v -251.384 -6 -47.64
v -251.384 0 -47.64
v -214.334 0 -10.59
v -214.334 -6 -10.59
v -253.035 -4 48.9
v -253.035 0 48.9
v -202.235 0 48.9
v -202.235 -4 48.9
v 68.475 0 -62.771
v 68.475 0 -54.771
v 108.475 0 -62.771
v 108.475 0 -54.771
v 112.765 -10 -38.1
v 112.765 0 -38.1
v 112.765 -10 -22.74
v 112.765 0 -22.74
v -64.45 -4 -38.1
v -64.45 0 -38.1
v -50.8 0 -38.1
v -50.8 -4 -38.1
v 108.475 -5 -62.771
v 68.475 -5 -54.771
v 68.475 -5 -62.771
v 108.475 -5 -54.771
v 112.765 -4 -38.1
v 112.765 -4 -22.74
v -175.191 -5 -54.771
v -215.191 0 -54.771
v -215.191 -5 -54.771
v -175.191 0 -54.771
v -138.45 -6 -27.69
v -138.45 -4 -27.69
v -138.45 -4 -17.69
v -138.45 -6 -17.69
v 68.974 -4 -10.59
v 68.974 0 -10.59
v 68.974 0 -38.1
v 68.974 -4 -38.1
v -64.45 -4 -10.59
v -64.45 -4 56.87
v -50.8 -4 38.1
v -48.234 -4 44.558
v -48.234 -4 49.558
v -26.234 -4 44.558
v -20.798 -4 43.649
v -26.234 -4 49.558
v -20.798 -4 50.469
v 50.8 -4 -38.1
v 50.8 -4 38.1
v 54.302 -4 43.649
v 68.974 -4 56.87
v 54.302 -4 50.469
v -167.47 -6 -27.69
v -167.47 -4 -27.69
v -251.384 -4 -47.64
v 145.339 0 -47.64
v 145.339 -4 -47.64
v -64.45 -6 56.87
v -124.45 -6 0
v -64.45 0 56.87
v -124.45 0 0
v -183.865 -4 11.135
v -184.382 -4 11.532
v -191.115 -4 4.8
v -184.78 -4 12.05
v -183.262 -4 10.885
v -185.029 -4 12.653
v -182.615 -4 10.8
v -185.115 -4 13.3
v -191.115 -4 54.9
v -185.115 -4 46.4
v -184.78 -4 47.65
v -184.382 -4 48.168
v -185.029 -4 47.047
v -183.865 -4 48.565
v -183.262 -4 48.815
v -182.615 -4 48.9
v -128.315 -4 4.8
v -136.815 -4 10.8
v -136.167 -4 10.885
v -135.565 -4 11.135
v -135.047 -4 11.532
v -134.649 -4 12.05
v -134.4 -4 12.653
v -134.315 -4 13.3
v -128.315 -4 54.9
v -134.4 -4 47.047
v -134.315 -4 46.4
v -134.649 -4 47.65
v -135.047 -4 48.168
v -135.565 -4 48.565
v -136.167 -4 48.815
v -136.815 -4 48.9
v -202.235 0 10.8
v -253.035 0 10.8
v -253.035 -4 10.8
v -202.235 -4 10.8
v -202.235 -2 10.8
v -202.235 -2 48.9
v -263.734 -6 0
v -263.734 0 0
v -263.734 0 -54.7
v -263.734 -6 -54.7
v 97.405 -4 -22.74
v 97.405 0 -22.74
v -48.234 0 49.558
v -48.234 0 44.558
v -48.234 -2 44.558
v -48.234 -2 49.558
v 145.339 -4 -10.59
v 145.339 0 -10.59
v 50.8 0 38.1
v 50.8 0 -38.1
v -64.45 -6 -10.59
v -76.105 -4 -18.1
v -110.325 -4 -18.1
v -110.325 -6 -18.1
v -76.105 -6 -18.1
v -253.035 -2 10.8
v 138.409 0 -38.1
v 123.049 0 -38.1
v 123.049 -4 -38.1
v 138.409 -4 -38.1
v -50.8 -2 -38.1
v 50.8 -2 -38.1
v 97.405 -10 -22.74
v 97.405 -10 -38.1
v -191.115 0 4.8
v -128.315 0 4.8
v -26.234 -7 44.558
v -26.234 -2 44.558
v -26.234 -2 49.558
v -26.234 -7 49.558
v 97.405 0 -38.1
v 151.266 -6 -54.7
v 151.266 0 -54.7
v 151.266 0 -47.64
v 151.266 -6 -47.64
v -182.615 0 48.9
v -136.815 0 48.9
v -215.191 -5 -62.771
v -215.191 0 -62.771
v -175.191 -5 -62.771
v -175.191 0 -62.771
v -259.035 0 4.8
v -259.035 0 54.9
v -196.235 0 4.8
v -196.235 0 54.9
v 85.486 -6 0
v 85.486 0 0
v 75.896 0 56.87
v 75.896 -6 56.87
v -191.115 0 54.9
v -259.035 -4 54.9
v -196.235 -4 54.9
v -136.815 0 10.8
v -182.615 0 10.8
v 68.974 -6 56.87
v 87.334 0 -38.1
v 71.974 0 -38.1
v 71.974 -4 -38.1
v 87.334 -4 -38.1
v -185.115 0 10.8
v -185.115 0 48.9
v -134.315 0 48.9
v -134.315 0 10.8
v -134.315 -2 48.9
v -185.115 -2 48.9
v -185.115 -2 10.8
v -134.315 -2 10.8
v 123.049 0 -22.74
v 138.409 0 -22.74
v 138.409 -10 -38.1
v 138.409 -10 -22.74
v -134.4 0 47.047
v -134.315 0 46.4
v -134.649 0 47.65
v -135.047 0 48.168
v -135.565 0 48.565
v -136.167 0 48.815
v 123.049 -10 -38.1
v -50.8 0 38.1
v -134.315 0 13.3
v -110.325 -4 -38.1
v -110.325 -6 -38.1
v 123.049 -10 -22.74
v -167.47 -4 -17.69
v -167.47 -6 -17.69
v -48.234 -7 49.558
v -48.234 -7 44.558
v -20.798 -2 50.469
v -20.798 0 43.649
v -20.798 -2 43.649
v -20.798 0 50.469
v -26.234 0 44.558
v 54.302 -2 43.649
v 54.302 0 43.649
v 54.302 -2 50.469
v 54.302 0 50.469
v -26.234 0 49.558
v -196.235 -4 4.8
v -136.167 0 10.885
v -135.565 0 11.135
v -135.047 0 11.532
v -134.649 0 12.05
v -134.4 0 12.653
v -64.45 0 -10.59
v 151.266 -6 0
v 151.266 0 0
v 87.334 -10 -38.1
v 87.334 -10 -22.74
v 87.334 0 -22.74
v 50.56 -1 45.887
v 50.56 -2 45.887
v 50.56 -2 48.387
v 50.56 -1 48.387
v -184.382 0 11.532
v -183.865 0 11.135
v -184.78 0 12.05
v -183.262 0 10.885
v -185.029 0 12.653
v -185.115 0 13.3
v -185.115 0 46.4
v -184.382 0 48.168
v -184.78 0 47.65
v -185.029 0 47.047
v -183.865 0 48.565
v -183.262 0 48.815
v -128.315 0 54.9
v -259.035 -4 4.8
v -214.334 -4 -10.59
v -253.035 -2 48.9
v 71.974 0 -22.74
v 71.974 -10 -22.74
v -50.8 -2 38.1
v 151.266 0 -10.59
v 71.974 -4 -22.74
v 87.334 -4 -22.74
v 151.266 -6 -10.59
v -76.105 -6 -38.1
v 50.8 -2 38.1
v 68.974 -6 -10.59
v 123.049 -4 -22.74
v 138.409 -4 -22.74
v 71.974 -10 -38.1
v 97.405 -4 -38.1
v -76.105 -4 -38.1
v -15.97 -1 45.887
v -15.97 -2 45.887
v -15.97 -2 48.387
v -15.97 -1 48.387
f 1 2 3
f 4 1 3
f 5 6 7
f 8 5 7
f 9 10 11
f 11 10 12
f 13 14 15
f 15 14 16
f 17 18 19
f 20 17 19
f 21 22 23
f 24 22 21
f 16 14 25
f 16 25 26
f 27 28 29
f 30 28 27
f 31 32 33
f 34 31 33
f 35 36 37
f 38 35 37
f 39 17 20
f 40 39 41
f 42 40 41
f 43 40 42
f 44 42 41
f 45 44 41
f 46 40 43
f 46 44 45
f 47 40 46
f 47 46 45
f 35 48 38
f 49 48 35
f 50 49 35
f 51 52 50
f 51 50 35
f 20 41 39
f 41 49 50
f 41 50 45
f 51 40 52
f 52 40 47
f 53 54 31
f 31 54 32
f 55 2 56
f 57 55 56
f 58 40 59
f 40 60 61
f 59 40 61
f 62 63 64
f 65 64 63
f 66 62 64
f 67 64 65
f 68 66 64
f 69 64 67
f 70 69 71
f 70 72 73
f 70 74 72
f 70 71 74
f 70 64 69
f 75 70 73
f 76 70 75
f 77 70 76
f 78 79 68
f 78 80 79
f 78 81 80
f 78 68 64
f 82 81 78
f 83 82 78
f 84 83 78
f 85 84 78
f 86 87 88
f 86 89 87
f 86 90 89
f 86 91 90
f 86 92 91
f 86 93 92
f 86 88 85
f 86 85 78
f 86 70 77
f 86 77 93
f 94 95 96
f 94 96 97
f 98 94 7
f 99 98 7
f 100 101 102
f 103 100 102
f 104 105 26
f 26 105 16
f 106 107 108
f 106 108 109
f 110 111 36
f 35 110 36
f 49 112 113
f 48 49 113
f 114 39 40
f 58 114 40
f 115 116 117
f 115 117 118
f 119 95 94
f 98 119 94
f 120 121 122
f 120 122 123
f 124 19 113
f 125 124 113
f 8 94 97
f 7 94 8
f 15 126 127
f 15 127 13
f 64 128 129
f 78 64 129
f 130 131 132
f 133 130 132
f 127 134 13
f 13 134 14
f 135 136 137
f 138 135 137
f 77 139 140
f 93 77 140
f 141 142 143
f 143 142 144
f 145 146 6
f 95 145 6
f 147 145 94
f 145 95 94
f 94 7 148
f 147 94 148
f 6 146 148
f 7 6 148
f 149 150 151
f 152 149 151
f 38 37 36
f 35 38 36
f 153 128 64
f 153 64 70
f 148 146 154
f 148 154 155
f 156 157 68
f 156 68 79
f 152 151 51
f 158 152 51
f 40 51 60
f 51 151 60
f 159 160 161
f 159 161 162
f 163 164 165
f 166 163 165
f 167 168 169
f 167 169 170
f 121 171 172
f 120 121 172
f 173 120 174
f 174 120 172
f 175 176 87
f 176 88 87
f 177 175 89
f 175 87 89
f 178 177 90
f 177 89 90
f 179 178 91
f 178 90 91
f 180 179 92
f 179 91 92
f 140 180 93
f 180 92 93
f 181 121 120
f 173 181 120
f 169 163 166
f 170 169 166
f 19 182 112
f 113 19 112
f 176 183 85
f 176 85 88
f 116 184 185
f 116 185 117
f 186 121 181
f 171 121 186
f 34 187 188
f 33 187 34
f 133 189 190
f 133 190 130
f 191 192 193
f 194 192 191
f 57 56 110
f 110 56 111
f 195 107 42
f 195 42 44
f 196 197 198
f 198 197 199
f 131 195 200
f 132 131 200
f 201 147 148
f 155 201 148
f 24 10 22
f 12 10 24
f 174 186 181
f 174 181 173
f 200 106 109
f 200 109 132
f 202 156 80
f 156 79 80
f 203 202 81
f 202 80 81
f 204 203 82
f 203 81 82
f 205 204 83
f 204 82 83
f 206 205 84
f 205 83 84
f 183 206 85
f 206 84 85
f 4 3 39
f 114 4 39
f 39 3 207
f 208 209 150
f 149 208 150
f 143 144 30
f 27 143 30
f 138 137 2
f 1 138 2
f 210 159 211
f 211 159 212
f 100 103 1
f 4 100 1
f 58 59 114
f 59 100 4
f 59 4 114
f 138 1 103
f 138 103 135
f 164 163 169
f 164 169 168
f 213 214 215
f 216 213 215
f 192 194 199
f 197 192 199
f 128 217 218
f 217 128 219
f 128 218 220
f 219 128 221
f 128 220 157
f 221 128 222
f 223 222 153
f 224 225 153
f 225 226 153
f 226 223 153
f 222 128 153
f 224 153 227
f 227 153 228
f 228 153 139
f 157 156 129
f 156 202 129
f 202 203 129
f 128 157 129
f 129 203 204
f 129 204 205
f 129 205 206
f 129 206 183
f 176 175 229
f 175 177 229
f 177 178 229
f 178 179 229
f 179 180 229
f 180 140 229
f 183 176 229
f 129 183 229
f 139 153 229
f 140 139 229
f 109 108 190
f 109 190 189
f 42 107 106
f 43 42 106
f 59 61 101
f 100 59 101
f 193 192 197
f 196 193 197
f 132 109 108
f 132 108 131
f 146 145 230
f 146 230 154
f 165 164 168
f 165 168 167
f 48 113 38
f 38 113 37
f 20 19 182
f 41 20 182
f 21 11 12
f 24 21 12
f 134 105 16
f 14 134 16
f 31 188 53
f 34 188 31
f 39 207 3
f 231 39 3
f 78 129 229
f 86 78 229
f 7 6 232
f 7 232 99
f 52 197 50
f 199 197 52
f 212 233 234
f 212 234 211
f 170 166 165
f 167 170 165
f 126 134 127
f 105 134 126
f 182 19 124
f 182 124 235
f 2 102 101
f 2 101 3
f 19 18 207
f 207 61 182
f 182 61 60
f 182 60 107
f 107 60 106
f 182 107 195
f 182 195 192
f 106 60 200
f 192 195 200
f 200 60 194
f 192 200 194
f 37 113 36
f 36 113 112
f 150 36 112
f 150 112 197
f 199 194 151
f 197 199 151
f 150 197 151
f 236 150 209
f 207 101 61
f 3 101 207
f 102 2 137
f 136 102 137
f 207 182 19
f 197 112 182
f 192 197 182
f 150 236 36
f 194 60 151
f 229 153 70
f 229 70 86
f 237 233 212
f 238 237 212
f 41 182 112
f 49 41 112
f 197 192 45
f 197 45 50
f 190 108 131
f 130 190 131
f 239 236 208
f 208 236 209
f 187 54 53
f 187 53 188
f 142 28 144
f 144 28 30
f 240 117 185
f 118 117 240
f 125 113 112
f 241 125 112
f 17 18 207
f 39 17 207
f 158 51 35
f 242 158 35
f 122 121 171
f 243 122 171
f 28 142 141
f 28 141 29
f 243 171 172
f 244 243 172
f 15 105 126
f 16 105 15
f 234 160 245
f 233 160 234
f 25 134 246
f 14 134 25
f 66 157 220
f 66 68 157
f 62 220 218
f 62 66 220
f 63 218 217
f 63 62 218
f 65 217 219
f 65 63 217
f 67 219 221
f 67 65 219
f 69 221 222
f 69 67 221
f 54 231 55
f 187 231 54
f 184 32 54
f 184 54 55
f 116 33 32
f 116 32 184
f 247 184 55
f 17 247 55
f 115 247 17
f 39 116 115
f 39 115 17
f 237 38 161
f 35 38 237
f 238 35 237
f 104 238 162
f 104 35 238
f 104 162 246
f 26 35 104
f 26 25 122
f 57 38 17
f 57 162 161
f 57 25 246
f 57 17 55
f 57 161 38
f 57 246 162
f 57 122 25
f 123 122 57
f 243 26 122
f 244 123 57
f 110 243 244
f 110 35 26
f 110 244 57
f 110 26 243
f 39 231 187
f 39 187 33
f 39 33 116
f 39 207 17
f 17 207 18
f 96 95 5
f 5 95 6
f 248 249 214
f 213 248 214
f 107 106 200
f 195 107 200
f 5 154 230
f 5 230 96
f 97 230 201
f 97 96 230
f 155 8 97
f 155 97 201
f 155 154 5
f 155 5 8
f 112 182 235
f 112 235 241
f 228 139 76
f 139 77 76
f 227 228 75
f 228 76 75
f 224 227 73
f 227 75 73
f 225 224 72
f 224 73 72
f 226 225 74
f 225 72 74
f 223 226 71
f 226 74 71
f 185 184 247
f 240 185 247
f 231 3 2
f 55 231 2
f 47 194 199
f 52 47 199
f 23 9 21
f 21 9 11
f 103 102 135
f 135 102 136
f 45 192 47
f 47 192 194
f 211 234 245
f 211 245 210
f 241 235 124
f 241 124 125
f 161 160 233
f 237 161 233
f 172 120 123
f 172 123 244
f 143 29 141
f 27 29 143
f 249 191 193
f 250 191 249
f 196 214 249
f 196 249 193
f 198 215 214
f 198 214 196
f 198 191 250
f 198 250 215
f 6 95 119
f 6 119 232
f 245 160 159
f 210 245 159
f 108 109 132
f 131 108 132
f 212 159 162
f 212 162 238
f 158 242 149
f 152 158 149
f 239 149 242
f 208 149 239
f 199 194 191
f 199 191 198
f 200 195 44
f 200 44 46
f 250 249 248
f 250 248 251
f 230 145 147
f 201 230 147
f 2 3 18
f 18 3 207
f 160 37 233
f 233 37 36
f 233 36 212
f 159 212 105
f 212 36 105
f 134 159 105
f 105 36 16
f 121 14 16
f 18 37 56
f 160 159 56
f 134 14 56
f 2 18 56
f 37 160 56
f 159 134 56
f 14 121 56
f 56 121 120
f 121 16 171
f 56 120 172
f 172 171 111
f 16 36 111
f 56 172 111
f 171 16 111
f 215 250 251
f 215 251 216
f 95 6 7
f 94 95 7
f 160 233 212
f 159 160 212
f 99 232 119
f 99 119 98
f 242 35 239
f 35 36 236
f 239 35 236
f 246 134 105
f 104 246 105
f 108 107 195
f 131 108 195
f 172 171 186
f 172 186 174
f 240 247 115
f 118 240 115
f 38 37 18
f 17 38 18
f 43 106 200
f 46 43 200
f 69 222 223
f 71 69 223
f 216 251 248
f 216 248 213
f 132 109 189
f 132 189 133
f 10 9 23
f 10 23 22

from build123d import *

# Parameters (mm, degrees)
F0_W      = 15.36
F0_H      = 15.36
F1_DEPTH  = 10
F0_W_2    = 50.8
F0_H_2    = 38.1
F0_W_3    = 101.6
F0_H_3    = 76.2
F0_W_4    = 75.1
F0_H_4    = 6.82
F0_W_5    = 22
F0_H_5    = 5
F2_DEPTH  = 2
F3_W      = 66.53
F3_H      = 2.5
F4_DEPTH  = 1
F5_DEPTH  = 4
F6_DEPTH  = 5
F0_W_6    = 62.8
F0_H_6    = 50.1
F7_DEPTH  = 4
F8_R      = 2.5
F9_DEPTH  = 6
F0_W_7    = 34.22
F0_H_7    = 20
F0_W_8    = 29.02
F0_H_8    = 10
F10_DEPTH = 4
F11_DEPTH = 6
F12_W     = 40
F12_H     = 8
F13_DEPTH = 5


with BuildPart() as f1:
    # F0 (on Front) → F1 (new body)
    with BuildSketch(Plane.XZ):
        with Locations((130.7291623282, -30.4200009418)):
            Rectangle(F0_W, F0_H)
        with Locations((105.0850164223, -30.4200009418)):
            Rectangle(F0_W, F0_H)
        with Locations((79.6542178917, -30.4200004709)):
            Rectangle(F0_W, F0_H)
    extrude(amount=F1_DEPTH)


with BuildPart() as f2:
    # F0 (on Front) → F2 (new body)
    with BuildSketch(Plane.XZ):
        with Locations((-227.6345144272, 29.8500025563)):
            Rectangle(F0_W_2, F0_H_2)
        with Locations((-159.7145144272, 29.8500025563)):
            Rectangle(F0_W_2, F0_H_2)
        Rectangle(F0_W_3, F0_H_3)
        with Locations((16.7518402368, 47.0588352716)):
            Rectangle(F0_W_4, F0_H_4)
        with Locations((-37.2341555208, 47.0578887403)):
            Rectangle(F0_W_5, F0_H_5)
    extrude(amount=F2_DEPTH)

    # F3 (on face) → F4 (cut)
    with BuildSketch(Plane.XZ.offset(2)):
        with Locations((17.2950534379, 47.1370157599)):
            Rectangle(F3_W, F3_H)
    extrude(amount=-F4_DEPTH, mode=Mode.SUBTRACT)


with BuildPart() as f5:
    # F0 (on Front) → F5 (new body)
    with BuildSketch(Plane.XZ):
        Polygon((-50.8, -38.1), (-50.8, 38.1), (50.8, 38.1), (50.8, -38.1), (68.974, -38.1), (68.974, -10.59), (68.974, 0), (68.974, 56.87), (-64.45, 56.87), (-64.45, 0), (-64.45, -10.59), (-64.45, -38.1), align=None)
        with Locations((-37.2341555208, 47.0578887403)):
            Rectangle(F0_W_5, F0_H_5, mode=Mode.SUBTRACT)
        with Locations((16.7518402368, 47.0588352716)):
            Rectangle(F0_W_4, F0_H_4, mode=Mode.SUBTRACT)
    extrude(amount=F5_DEPTH)

    # F0 (on Front) → F9 (join)
    with BuildSketch(Plane.XZ):
        Polygon((-214.334, -10.59), (-64.45, -10.59), (-64.45, 0), (-124.45, 0), (-263.734, 0), (-263.734, -10.59), align=None)
        Polygon((-251.384, -47.64), (-214.334, -10.59), (-263.734, -10.59), (-263.734, -47.64), align=None)
        Polygon((-124.45, 0), (-64.45, 0), (-64.45, 56.87), align=None)
        Polygon((68.974, -47.64), (-64.45, -47.64), (-251.384, -47.64), (-263.734, -47.64), (-263.734, -54.7), (151.266, -54.7), (151.266, -47.64), (145.339, -47.64), align=None)
        Polygon((68.974, 56.87), (68.974, 0), (85.4858756065, 0), (75.8961886168, 56.87), align=None)
        Polygon((68.974, 0), (68.974, -10.59), (145.339, -10.59), (151.266, -10.59), (151.266, 0), (85.4858756065, 0), align=None)
    extrude(amount=F9_DEPTH)


with BuildPart() as f6:
    # F6 (new): a face of the model
    f6_faces = [f2.part.faces().sort_by_distance(p)[0] for p in [
        (-37.2341555208, -2, 47.0578887403),
    ]]
    extrude(f6_faces, amount=F6_DEPTH)


with BuildPart() as f7:
    # F0 (on Front) → F7 (new body)
    with BuildSketch(Plane.XZ):
        with Locations((-227.6345144272, 29.8500025563)):
            Rectangle(F0_W_6, F0_H_6)
        with Locations((-227.6345144272, 29.8500025563)):
            Rectangle(F0_W_2, F0_H_2, mode=Mode.SUBTRACT)
        with Locations((-159.7145144272, 29.8500025563)):
            Rectangle(F0_W_6, F0_H_6)
        with Locations((-159.7145144272, 29.8500025563)):
            Rectangle(F0_W_2, F0_H_2, mode=Mode.SUBTRACT)
    extrude(amount=F7_DEPTH)

    # F8
    f8_edges = [f7.edges().sort_by_distance(p)[0] for p in [
        (-134.314514, -2, 48.900003),
        (-185.114514, -2, 48.900003),
        (-134.314514, -2, 10.800003),
        (-185.114514, -2, 10.800003),
    ]]
    fillet(f8_edges, radius=F8_R)


with BuildPart() as f10:
    # F0 (on Front) → F10 (new body)
    with BuildSketch(Plane.XZ):
        Polygon((-64.45, -47.64), (-64.45, -38.1), (-64.45, -10.59), (-214.334, -10.59), (-251.384, -47.64), align=None)
        with Locations((-93.215491517, -28.1000004709)):
            Rectangle(F0_W_7, F0_H_7, mode=Mode.SUBTRACT)
        with Locations((-152.96, -22.69)):
            Rectangle(F0_W_8, F0_H_8, mode=Mode.SUBTRACT)
        Polygon((50.8, -38.1), (-50.8, -38.1), (-64.45, -38.1), (-64.45, -47.64), (68.974, -47.64), (68.974, -38.1), align=None)
        Polygon((68.974, -10.59), (68.974, -38.1), (68.974, -47.64), (145.339, -47.64), (145.339, -10.59), align=None)
        with Locations((79.6542178917, -30.4200004709)):
            Rectangle(F0_W, F0_H, mode=Mode.SUBTRACT)
        with Locations((105.0850164223, -30.4200009418)):
            Rectangle(F0_W, F0_H, mode=Mode.SUBTRACT)
        with Locations((130.7291623282, -30.4200009418)):
            Rectangle(F0_W, F0_H, mode=Mode.SUBTRACT)
    extrude(amount=F10_DEPTH)

    # F0 (on Front) → F11 (join)
    with BuildSketch(Plane.XZ):
        with Locations((-152.96, -22.69)):
            Rectangle(F0_W_8, F0_H_8)
        with Locations((-93.215491517, -28.1000004709)):
            Rectangle(F0_W_7, F0_H_7)
    extrude(amount=F11_DEPTH)


with BuildPart() as f13:
    # F12 (on Front) → F13 (new body)
    with BuildSketch(Plane.XZ):
        with Locations((-195.1909852028, -58.7713040709)):
            Rectangle(F12_W, F12_H)
        with Locations((88.4745162725, -58.7713040709)):
            Rectangle(F12_W, F12_H)
    extrude(amount=F13_DEPTH)


solid = Compound([f1.part, f2.part, f5.part, f6.part, f7.part, f10.part, f13.part])
